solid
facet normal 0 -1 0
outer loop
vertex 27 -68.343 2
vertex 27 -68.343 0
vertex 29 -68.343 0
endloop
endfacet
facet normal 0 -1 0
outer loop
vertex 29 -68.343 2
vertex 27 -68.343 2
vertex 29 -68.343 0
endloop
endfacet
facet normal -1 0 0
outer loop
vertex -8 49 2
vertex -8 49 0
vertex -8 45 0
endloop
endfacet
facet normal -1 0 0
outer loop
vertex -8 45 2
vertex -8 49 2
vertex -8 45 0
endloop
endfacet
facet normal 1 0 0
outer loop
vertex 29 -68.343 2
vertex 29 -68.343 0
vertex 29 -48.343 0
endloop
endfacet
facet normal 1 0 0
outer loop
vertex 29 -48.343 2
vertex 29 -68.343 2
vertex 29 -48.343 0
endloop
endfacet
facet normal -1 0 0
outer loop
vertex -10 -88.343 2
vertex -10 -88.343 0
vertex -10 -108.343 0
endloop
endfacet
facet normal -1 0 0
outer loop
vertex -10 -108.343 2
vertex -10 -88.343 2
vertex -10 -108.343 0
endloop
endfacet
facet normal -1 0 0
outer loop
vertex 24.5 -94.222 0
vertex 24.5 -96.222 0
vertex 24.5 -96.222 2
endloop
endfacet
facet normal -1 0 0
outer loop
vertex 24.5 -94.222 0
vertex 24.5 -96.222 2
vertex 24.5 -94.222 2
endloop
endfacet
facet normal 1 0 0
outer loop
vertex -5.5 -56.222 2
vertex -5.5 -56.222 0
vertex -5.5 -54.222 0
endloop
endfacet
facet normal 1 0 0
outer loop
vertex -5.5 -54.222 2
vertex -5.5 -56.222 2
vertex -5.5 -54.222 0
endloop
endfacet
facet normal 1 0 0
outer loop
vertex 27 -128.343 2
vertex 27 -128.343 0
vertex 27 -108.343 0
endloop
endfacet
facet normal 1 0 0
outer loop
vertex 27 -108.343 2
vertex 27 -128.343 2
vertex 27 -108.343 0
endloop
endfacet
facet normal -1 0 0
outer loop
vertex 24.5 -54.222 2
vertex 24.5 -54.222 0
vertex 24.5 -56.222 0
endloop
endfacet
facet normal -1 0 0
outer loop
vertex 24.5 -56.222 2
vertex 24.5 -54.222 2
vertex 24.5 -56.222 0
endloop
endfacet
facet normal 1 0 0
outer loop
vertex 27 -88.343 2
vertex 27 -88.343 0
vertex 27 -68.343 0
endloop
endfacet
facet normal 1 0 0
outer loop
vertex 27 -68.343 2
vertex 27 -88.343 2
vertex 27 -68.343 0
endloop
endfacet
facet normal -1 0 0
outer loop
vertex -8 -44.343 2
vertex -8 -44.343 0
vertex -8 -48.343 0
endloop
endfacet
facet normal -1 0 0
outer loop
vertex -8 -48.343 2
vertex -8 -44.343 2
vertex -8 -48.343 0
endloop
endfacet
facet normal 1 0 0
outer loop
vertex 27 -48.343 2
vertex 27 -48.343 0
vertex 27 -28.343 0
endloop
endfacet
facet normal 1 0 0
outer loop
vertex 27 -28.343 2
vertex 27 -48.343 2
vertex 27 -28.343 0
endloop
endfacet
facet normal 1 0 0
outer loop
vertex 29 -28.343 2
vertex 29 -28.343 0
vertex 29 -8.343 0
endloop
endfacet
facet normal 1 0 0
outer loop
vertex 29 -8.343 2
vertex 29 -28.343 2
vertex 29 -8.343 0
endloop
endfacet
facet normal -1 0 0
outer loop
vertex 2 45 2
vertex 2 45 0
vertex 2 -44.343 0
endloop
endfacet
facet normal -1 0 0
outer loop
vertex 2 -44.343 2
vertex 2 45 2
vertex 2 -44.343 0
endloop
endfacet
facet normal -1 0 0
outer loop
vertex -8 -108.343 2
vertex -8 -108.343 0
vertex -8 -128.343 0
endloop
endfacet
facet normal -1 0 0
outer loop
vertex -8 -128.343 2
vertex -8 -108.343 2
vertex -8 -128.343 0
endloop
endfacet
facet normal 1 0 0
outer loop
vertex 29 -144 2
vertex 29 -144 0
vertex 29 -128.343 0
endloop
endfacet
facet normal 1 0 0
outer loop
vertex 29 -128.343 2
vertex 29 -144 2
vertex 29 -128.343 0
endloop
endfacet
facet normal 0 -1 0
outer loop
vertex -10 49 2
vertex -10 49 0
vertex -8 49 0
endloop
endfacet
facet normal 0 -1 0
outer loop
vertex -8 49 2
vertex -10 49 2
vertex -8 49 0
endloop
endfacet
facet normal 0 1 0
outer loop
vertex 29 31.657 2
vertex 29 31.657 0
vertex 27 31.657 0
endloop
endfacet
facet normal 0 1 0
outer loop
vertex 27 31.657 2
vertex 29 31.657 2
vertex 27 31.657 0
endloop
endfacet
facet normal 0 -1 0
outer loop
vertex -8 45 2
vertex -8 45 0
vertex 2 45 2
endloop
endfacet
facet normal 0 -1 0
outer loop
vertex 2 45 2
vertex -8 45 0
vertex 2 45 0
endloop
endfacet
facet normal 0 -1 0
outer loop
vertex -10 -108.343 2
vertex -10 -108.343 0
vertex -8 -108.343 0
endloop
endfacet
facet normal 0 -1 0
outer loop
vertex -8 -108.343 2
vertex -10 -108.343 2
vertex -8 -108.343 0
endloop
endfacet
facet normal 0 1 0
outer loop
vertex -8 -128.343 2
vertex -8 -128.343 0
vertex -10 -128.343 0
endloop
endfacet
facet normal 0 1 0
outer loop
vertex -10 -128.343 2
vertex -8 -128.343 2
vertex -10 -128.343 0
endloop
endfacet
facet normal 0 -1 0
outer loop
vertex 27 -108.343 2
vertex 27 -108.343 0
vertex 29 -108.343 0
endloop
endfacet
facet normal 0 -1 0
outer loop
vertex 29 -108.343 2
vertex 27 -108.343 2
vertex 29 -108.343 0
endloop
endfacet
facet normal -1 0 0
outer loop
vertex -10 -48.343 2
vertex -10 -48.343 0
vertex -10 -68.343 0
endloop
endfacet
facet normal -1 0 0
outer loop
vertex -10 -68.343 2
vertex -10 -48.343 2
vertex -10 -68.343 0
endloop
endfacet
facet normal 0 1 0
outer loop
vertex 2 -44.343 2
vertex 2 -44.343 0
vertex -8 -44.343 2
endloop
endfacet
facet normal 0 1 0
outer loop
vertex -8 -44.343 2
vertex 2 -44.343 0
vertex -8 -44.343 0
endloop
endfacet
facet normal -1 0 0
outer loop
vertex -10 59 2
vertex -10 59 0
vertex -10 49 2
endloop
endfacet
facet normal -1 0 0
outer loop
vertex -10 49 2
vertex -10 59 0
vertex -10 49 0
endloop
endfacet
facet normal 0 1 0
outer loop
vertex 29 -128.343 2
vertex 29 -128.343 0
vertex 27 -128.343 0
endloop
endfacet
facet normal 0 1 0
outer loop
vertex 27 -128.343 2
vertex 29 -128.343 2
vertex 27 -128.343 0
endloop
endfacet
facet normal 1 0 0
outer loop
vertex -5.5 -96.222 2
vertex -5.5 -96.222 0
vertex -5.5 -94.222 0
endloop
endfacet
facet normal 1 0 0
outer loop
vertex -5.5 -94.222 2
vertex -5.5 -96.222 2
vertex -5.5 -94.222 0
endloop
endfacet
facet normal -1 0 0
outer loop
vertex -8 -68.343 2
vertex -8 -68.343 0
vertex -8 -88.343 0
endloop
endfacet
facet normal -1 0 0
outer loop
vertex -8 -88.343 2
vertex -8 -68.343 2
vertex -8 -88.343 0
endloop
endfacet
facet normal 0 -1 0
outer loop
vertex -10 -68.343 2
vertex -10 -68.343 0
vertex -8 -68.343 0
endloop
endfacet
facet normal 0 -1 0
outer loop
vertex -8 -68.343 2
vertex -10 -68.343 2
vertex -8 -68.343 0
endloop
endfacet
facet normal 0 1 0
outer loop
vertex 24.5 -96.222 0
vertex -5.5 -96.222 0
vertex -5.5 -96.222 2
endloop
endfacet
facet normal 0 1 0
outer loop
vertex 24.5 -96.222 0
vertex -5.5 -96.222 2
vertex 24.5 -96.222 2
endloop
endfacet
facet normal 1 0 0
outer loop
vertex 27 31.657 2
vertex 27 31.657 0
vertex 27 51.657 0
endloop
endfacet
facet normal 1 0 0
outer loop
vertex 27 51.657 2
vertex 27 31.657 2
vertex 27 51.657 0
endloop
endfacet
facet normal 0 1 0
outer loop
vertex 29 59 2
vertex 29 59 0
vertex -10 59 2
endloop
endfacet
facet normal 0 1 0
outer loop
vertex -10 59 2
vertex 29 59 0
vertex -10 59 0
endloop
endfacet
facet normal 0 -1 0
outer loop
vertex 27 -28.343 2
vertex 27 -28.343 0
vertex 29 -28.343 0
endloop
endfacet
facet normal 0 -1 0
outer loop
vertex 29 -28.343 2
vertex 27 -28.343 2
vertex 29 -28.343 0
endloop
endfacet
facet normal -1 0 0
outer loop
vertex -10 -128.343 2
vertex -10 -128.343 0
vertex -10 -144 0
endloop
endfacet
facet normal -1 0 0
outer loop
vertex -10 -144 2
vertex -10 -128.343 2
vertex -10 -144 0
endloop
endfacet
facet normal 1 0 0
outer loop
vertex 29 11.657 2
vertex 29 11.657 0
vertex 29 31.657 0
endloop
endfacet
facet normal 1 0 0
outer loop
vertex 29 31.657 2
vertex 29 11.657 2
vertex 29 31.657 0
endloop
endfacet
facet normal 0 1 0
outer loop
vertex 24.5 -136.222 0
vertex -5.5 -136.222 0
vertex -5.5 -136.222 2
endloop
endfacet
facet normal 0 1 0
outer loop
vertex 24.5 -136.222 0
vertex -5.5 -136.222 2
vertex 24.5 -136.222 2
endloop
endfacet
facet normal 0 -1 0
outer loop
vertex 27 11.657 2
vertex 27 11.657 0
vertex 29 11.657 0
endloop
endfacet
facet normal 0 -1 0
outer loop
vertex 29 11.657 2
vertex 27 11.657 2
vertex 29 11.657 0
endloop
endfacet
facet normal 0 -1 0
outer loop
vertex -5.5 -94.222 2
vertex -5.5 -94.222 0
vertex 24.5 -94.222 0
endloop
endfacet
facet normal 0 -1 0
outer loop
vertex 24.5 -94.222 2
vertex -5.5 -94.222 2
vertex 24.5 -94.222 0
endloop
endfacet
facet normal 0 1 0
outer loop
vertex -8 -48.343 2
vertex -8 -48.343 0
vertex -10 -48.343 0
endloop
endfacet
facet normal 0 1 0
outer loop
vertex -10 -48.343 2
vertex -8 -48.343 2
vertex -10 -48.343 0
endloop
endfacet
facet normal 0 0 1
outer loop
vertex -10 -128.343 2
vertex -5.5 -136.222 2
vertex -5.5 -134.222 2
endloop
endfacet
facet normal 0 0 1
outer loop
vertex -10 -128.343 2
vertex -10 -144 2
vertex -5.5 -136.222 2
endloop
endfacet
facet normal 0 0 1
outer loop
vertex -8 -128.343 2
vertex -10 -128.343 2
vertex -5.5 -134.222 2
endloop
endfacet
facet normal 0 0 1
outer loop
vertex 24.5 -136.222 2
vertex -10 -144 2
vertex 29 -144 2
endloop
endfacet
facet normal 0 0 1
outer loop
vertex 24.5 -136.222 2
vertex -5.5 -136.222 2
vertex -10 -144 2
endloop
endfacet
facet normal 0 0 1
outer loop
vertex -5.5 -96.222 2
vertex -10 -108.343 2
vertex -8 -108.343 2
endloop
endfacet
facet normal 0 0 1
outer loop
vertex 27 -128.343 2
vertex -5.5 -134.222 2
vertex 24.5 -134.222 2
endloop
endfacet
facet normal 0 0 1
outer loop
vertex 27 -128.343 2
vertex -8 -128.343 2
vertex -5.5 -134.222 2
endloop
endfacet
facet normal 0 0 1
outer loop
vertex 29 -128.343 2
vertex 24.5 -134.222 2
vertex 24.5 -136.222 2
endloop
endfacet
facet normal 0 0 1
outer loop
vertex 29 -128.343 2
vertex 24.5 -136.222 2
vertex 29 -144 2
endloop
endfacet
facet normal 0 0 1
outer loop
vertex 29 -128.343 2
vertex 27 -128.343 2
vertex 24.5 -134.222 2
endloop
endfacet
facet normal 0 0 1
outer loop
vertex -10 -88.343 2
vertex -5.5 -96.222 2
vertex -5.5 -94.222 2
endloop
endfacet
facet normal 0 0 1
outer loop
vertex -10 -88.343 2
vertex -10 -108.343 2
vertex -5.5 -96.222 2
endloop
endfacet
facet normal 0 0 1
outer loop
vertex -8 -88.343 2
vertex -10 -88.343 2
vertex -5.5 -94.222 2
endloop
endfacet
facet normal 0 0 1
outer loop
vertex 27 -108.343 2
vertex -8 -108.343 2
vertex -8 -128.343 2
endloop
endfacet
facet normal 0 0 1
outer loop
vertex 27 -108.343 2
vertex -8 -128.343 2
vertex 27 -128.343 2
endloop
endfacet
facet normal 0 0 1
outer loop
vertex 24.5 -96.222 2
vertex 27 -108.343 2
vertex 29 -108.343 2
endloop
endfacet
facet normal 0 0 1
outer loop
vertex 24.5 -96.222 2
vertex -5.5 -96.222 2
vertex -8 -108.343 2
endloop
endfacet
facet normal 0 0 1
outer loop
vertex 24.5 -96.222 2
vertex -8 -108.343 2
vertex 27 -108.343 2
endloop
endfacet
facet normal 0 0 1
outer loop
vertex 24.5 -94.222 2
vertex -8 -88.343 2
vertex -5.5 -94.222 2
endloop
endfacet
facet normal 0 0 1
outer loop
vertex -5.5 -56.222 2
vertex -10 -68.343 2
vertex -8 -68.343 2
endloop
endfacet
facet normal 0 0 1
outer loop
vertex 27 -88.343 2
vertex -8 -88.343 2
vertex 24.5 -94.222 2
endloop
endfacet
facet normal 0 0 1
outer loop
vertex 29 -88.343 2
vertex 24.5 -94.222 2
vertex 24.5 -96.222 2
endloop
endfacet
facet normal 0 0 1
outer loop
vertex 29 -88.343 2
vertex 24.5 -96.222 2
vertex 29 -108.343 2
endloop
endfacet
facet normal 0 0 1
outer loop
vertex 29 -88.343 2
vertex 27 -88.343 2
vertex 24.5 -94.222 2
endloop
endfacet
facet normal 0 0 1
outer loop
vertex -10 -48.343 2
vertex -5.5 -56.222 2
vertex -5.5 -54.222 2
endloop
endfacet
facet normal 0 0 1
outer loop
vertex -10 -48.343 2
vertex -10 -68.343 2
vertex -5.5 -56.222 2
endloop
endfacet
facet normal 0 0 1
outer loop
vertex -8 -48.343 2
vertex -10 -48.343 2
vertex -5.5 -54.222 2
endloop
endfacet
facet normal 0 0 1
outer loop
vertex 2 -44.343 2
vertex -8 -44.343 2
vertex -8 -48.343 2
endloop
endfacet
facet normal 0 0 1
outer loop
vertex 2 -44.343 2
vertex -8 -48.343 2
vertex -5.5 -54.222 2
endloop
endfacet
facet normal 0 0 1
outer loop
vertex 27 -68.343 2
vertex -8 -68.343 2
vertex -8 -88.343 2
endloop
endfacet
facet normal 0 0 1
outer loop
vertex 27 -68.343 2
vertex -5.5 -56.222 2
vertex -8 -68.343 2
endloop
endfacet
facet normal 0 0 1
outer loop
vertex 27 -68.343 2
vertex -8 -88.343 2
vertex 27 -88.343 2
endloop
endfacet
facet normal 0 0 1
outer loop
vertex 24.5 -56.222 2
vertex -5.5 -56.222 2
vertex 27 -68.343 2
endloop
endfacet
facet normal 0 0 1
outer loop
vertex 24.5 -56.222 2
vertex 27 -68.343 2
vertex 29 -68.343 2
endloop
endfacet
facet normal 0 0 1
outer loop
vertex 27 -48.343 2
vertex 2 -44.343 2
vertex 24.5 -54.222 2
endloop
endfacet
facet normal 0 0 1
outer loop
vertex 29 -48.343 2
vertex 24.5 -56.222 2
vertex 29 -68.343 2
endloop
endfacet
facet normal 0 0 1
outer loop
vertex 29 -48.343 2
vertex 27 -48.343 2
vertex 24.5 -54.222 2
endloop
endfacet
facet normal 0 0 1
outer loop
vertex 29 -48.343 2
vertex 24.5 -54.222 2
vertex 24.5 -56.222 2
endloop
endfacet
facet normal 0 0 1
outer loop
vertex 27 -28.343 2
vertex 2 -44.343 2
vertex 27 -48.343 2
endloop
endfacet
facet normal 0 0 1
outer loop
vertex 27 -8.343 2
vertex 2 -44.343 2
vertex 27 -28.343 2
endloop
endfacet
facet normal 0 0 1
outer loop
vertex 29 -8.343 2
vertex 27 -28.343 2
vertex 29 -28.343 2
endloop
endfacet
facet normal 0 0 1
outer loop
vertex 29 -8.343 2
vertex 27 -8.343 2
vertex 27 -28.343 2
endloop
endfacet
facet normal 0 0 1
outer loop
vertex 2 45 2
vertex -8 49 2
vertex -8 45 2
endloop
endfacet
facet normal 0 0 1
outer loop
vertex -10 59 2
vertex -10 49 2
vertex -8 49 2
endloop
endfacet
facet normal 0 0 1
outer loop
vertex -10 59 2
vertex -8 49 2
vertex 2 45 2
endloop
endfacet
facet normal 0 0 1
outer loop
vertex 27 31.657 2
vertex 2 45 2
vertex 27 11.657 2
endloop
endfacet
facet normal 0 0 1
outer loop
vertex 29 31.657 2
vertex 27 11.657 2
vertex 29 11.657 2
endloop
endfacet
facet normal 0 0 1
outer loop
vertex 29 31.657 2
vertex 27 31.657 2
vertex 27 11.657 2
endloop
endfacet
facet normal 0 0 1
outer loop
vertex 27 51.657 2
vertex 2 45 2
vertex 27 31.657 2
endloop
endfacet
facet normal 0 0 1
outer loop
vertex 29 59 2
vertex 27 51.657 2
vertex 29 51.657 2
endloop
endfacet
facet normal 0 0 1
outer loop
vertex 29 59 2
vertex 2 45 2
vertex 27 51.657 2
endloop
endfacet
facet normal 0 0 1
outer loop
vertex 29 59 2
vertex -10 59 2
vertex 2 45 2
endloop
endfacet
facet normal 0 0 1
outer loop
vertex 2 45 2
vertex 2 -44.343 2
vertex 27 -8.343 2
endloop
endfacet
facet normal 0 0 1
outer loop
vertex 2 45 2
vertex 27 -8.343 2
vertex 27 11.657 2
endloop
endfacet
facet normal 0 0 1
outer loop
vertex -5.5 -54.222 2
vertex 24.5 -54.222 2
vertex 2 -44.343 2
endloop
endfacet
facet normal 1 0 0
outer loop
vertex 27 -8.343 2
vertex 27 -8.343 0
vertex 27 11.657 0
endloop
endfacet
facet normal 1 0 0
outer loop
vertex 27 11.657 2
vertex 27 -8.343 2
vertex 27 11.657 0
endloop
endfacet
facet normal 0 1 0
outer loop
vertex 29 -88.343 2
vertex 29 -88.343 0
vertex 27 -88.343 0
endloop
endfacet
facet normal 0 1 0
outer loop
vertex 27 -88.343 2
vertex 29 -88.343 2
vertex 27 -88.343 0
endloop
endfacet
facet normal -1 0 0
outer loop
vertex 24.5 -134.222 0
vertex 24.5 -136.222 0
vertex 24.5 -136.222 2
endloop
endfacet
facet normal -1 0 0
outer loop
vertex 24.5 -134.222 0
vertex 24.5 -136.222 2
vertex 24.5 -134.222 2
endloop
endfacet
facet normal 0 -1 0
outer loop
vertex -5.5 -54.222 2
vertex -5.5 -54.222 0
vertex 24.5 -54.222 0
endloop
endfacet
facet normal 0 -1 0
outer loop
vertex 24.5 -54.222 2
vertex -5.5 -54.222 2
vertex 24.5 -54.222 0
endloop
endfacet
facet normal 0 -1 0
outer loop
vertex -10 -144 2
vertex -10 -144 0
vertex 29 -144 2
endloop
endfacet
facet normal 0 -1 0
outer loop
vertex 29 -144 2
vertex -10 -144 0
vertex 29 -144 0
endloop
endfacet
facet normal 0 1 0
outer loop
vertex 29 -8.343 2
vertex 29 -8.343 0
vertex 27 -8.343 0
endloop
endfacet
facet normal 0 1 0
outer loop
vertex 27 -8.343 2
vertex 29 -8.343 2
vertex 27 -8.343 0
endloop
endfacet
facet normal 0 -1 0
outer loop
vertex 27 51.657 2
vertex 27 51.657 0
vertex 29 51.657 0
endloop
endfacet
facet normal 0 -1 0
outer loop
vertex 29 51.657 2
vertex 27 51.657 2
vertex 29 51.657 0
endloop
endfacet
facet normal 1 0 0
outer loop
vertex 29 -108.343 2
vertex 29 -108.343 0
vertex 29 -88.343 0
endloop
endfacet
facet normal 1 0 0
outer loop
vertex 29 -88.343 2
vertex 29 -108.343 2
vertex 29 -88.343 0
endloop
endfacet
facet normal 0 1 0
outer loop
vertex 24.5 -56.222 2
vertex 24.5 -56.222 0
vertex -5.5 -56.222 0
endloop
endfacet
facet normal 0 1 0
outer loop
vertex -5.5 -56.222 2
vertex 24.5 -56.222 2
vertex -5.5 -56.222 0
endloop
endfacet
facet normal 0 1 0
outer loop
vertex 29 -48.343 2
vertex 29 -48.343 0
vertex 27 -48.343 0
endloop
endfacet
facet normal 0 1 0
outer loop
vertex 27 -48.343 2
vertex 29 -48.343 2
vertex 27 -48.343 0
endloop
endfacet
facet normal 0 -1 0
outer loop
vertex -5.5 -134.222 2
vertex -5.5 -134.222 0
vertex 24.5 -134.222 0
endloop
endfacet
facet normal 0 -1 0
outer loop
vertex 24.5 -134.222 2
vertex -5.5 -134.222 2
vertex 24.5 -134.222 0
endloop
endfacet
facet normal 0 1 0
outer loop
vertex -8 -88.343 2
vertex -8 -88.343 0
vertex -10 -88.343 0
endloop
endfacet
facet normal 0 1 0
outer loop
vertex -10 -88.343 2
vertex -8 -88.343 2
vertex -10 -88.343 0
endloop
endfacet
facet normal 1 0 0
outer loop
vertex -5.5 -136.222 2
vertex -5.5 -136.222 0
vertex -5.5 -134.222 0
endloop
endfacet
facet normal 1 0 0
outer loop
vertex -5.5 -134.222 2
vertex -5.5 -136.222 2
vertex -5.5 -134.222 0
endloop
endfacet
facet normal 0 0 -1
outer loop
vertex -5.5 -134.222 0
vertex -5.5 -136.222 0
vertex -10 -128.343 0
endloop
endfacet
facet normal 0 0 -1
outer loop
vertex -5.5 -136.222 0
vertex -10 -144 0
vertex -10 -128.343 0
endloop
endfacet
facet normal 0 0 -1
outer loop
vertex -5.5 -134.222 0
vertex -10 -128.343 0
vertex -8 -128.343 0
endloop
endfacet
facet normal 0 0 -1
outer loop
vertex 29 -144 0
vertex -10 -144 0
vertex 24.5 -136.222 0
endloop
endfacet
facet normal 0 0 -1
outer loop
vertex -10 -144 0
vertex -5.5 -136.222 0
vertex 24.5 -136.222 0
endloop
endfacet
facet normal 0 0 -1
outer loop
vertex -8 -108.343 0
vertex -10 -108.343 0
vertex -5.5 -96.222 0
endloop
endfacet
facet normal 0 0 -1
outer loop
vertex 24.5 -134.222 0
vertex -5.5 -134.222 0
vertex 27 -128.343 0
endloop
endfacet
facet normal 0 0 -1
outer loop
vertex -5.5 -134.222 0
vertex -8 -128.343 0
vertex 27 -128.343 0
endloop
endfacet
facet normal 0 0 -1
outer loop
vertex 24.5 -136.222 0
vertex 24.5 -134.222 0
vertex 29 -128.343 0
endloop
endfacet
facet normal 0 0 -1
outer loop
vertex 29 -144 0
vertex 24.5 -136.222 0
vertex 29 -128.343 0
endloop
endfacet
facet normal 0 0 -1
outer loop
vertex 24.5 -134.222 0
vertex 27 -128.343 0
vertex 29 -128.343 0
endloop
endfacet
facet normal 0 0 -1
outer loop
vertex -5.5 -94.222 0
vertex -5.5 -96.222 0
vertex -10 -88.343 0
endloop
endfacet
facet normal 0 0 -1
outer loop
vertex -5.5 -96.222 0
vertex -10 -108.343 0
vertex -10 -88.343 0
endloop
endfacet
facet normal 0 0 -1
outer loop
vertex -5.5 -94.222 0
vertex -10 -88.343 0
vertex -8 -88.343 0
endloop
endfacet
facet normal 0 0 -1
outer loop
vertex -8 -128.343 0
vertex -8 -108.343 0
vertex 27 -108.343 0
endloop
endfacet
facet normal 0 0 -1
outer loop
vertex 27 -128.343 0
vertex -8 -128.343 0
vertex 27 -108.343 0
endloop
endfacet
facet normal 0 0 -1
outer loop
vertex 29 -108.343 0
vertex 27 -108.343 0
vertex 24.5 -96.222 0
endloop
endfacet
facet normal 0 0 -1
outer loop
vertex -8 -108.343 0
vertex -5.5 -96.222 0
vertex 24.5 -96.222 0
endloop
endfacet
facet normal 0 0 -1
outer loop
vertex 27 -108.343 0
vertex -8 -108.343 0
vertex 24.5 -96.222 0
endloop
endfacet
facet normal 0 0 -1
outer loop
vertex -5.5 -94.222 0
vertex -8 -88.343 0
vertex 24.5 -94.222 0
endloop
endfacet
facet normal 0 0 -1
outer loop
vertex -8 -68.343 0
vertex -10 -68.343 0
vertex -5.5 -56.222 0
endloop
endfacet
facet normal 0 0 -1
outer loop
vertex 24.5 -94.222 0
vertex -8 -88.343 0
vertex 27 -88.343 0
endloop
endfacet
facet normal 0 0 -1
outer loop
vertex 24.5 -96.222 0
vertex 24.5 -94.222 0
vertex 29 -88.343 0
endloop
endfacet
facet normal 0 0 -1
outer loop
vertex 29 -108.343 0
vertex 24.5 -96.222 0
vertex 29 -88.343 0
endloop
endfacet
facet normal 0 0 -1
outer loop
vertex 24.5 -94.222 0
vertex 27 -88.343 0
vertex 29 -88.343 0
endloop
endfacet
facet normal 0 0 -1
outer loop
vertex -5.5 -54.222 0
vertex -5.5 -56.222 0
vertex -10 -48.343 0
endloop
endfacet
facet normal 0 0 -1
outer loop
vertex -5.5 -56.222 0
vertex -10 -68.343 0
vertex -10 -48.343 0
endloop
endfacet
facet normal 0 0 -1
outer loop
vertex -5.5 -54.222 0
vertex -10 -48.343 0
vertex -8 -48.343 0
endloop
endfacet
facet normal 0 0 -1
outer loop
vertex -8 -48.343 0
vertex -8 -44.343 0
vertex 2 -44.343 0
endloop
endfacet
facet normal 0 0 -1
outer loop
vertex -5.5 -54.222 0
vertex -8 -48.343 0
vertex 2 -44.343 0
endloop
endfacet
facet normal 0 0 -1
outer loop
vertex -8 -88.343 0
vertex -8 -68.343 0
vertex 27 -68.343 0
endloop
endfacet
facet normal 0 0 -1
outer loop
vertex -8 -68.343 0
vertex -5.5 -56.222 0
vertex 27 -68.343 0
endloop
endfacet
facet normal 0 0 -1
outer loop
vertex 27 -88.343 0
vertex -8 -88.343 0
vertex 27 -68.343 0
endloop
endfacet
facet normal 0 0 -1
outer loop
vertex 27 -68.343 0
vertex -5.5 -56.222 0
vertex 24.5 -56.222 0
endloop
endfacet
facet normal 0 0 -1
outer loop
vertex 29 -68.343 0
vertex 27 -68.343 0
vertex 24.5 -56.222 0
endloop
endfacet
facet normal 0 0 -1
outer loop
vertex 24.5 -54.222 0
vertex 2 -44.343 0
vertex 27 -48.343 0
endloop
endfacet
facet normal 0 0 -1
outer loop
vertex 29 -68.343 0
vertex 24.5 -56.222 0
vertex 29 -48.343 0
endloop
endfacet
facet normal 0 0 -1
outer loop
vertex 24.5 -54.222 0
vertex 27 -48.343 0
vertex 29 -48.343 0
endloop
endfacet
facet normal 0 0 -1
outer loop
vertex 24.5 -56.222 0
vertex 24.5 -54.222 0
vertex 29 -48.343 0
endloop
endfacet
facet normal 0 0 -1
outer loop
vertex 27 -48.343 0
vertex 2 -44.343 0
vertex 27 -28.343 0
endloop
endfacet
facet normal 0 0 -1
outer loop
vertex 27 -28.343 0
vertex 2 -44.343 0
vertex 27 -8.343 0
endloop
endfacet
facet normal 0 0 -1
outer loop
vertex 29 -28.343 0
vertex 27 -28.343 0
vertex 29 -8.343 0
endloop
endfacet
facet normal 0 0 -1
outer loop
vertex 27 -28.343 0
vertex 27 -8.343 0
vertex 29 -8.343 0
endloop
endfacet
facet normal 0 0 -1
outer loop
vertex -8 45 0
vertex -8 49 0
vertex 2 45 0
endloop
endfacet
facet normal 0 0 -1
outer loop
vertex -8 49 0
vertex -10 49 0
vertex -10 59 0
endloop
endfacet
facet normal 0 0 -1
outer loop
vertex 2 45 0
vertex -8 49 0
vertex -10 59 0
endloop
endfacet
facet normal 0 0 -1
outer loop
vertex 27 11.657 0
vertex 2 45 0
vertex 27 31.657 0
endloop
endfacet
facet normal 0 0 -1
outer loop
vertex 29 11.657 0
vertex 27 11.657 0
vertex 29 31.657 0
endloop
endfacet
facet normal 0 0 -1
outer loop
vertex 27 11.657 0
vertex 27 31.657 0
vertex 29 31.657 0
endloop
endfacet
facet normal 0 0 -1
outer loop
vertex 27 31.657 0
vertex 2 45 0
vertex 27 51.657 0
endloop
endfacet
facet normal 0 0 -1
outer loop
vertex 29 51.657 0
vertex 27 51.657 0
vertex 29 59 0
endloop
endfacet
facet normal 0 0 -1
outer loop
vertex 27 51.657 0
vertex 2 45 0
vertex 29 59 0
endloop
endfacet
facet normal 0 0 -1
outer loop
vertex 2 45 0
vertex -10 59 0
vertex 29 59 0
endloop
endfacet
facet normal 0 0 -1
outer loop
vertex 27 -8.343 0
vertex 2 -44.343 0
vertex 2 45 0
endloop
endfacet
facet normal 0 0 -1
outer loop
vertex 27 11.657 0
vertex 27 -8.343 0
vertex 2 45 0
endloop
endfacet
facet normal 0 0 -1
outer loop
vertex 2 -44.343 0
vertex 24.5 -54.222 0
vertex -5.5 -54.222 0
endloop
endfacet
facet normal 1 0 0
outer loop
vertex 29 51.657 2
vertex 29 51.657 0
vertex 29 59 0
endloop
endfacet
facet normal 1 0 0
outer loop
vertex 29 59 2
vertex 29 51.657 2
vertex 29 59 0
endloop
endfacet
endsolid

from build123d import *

# Parameters (mm, degrees)
SKETCH_1_W      = 30
SKETCH_1_H      = 2
EXTRUDE_2_DEPTH = 2


with BuildPart() as part:
    # 草图1 → 凸台-拉伸2 (new body)
    with BuildSketch(Plane.XY):
        Polygon((-8, 49), (-8, 45), (2, 45), (2, 33.89311496), (2, -33.9722289), (2, -44.34252785), (-8, -44.34252785), (-8, -48.34252785), (-10, -48.34252785), (-10, -68.34252785), (-8, -68.34252785), (-8, -88.34252785), (-10, -88.34252785), (-10, -108.34252785), (-8, -108.34252785), (-8, -128.34252785), (-10, -128.34252785), (-10, -144), (-8, -144), (27, -144), (29, -144), (29, -128.34252785), (27, -128.34252785), (27, -108.34252785), (29, -108.34252785), (29, -88.34252785), (27, -88.34252785), (27, -68.34252785), (29, -68.34252785), (29, -48.34252785), (27, -48.34252785), (27, -28.34252785), (29, -28.34252785), (29, -8.34252785), (27, -8.34252785), (27, 11.65747215), (29, 11.65747215), (29, 31.65747215), (27, 31.65747215), (27, 51.65747215), (29, 51.65747215), (29, 59), (-10, 59), (-10, 49), align=None)
        Polygon((9.5, -54.22154055), (24.5, -54.22154055), (24.5, -56.22154055), (-5.5, -56.22154055), (-5.5, -54.22154055), align=None, mode=Mode.SUBTRACT)
        with Locations((9.5, -95.22154055)):
            Rectangle(SKETCH_1_W, SKETCH_1_H, mode=Mode.SUBTRACT)
        with Locations((9.5, -135.22154055)):
            Rectangle(SKETCH_1_W, SKETCH_1_H, mode=Mode.SUBTRACT)
    extrude(amount=EXTRUDE_2_DEPTH)


solid = part.part
